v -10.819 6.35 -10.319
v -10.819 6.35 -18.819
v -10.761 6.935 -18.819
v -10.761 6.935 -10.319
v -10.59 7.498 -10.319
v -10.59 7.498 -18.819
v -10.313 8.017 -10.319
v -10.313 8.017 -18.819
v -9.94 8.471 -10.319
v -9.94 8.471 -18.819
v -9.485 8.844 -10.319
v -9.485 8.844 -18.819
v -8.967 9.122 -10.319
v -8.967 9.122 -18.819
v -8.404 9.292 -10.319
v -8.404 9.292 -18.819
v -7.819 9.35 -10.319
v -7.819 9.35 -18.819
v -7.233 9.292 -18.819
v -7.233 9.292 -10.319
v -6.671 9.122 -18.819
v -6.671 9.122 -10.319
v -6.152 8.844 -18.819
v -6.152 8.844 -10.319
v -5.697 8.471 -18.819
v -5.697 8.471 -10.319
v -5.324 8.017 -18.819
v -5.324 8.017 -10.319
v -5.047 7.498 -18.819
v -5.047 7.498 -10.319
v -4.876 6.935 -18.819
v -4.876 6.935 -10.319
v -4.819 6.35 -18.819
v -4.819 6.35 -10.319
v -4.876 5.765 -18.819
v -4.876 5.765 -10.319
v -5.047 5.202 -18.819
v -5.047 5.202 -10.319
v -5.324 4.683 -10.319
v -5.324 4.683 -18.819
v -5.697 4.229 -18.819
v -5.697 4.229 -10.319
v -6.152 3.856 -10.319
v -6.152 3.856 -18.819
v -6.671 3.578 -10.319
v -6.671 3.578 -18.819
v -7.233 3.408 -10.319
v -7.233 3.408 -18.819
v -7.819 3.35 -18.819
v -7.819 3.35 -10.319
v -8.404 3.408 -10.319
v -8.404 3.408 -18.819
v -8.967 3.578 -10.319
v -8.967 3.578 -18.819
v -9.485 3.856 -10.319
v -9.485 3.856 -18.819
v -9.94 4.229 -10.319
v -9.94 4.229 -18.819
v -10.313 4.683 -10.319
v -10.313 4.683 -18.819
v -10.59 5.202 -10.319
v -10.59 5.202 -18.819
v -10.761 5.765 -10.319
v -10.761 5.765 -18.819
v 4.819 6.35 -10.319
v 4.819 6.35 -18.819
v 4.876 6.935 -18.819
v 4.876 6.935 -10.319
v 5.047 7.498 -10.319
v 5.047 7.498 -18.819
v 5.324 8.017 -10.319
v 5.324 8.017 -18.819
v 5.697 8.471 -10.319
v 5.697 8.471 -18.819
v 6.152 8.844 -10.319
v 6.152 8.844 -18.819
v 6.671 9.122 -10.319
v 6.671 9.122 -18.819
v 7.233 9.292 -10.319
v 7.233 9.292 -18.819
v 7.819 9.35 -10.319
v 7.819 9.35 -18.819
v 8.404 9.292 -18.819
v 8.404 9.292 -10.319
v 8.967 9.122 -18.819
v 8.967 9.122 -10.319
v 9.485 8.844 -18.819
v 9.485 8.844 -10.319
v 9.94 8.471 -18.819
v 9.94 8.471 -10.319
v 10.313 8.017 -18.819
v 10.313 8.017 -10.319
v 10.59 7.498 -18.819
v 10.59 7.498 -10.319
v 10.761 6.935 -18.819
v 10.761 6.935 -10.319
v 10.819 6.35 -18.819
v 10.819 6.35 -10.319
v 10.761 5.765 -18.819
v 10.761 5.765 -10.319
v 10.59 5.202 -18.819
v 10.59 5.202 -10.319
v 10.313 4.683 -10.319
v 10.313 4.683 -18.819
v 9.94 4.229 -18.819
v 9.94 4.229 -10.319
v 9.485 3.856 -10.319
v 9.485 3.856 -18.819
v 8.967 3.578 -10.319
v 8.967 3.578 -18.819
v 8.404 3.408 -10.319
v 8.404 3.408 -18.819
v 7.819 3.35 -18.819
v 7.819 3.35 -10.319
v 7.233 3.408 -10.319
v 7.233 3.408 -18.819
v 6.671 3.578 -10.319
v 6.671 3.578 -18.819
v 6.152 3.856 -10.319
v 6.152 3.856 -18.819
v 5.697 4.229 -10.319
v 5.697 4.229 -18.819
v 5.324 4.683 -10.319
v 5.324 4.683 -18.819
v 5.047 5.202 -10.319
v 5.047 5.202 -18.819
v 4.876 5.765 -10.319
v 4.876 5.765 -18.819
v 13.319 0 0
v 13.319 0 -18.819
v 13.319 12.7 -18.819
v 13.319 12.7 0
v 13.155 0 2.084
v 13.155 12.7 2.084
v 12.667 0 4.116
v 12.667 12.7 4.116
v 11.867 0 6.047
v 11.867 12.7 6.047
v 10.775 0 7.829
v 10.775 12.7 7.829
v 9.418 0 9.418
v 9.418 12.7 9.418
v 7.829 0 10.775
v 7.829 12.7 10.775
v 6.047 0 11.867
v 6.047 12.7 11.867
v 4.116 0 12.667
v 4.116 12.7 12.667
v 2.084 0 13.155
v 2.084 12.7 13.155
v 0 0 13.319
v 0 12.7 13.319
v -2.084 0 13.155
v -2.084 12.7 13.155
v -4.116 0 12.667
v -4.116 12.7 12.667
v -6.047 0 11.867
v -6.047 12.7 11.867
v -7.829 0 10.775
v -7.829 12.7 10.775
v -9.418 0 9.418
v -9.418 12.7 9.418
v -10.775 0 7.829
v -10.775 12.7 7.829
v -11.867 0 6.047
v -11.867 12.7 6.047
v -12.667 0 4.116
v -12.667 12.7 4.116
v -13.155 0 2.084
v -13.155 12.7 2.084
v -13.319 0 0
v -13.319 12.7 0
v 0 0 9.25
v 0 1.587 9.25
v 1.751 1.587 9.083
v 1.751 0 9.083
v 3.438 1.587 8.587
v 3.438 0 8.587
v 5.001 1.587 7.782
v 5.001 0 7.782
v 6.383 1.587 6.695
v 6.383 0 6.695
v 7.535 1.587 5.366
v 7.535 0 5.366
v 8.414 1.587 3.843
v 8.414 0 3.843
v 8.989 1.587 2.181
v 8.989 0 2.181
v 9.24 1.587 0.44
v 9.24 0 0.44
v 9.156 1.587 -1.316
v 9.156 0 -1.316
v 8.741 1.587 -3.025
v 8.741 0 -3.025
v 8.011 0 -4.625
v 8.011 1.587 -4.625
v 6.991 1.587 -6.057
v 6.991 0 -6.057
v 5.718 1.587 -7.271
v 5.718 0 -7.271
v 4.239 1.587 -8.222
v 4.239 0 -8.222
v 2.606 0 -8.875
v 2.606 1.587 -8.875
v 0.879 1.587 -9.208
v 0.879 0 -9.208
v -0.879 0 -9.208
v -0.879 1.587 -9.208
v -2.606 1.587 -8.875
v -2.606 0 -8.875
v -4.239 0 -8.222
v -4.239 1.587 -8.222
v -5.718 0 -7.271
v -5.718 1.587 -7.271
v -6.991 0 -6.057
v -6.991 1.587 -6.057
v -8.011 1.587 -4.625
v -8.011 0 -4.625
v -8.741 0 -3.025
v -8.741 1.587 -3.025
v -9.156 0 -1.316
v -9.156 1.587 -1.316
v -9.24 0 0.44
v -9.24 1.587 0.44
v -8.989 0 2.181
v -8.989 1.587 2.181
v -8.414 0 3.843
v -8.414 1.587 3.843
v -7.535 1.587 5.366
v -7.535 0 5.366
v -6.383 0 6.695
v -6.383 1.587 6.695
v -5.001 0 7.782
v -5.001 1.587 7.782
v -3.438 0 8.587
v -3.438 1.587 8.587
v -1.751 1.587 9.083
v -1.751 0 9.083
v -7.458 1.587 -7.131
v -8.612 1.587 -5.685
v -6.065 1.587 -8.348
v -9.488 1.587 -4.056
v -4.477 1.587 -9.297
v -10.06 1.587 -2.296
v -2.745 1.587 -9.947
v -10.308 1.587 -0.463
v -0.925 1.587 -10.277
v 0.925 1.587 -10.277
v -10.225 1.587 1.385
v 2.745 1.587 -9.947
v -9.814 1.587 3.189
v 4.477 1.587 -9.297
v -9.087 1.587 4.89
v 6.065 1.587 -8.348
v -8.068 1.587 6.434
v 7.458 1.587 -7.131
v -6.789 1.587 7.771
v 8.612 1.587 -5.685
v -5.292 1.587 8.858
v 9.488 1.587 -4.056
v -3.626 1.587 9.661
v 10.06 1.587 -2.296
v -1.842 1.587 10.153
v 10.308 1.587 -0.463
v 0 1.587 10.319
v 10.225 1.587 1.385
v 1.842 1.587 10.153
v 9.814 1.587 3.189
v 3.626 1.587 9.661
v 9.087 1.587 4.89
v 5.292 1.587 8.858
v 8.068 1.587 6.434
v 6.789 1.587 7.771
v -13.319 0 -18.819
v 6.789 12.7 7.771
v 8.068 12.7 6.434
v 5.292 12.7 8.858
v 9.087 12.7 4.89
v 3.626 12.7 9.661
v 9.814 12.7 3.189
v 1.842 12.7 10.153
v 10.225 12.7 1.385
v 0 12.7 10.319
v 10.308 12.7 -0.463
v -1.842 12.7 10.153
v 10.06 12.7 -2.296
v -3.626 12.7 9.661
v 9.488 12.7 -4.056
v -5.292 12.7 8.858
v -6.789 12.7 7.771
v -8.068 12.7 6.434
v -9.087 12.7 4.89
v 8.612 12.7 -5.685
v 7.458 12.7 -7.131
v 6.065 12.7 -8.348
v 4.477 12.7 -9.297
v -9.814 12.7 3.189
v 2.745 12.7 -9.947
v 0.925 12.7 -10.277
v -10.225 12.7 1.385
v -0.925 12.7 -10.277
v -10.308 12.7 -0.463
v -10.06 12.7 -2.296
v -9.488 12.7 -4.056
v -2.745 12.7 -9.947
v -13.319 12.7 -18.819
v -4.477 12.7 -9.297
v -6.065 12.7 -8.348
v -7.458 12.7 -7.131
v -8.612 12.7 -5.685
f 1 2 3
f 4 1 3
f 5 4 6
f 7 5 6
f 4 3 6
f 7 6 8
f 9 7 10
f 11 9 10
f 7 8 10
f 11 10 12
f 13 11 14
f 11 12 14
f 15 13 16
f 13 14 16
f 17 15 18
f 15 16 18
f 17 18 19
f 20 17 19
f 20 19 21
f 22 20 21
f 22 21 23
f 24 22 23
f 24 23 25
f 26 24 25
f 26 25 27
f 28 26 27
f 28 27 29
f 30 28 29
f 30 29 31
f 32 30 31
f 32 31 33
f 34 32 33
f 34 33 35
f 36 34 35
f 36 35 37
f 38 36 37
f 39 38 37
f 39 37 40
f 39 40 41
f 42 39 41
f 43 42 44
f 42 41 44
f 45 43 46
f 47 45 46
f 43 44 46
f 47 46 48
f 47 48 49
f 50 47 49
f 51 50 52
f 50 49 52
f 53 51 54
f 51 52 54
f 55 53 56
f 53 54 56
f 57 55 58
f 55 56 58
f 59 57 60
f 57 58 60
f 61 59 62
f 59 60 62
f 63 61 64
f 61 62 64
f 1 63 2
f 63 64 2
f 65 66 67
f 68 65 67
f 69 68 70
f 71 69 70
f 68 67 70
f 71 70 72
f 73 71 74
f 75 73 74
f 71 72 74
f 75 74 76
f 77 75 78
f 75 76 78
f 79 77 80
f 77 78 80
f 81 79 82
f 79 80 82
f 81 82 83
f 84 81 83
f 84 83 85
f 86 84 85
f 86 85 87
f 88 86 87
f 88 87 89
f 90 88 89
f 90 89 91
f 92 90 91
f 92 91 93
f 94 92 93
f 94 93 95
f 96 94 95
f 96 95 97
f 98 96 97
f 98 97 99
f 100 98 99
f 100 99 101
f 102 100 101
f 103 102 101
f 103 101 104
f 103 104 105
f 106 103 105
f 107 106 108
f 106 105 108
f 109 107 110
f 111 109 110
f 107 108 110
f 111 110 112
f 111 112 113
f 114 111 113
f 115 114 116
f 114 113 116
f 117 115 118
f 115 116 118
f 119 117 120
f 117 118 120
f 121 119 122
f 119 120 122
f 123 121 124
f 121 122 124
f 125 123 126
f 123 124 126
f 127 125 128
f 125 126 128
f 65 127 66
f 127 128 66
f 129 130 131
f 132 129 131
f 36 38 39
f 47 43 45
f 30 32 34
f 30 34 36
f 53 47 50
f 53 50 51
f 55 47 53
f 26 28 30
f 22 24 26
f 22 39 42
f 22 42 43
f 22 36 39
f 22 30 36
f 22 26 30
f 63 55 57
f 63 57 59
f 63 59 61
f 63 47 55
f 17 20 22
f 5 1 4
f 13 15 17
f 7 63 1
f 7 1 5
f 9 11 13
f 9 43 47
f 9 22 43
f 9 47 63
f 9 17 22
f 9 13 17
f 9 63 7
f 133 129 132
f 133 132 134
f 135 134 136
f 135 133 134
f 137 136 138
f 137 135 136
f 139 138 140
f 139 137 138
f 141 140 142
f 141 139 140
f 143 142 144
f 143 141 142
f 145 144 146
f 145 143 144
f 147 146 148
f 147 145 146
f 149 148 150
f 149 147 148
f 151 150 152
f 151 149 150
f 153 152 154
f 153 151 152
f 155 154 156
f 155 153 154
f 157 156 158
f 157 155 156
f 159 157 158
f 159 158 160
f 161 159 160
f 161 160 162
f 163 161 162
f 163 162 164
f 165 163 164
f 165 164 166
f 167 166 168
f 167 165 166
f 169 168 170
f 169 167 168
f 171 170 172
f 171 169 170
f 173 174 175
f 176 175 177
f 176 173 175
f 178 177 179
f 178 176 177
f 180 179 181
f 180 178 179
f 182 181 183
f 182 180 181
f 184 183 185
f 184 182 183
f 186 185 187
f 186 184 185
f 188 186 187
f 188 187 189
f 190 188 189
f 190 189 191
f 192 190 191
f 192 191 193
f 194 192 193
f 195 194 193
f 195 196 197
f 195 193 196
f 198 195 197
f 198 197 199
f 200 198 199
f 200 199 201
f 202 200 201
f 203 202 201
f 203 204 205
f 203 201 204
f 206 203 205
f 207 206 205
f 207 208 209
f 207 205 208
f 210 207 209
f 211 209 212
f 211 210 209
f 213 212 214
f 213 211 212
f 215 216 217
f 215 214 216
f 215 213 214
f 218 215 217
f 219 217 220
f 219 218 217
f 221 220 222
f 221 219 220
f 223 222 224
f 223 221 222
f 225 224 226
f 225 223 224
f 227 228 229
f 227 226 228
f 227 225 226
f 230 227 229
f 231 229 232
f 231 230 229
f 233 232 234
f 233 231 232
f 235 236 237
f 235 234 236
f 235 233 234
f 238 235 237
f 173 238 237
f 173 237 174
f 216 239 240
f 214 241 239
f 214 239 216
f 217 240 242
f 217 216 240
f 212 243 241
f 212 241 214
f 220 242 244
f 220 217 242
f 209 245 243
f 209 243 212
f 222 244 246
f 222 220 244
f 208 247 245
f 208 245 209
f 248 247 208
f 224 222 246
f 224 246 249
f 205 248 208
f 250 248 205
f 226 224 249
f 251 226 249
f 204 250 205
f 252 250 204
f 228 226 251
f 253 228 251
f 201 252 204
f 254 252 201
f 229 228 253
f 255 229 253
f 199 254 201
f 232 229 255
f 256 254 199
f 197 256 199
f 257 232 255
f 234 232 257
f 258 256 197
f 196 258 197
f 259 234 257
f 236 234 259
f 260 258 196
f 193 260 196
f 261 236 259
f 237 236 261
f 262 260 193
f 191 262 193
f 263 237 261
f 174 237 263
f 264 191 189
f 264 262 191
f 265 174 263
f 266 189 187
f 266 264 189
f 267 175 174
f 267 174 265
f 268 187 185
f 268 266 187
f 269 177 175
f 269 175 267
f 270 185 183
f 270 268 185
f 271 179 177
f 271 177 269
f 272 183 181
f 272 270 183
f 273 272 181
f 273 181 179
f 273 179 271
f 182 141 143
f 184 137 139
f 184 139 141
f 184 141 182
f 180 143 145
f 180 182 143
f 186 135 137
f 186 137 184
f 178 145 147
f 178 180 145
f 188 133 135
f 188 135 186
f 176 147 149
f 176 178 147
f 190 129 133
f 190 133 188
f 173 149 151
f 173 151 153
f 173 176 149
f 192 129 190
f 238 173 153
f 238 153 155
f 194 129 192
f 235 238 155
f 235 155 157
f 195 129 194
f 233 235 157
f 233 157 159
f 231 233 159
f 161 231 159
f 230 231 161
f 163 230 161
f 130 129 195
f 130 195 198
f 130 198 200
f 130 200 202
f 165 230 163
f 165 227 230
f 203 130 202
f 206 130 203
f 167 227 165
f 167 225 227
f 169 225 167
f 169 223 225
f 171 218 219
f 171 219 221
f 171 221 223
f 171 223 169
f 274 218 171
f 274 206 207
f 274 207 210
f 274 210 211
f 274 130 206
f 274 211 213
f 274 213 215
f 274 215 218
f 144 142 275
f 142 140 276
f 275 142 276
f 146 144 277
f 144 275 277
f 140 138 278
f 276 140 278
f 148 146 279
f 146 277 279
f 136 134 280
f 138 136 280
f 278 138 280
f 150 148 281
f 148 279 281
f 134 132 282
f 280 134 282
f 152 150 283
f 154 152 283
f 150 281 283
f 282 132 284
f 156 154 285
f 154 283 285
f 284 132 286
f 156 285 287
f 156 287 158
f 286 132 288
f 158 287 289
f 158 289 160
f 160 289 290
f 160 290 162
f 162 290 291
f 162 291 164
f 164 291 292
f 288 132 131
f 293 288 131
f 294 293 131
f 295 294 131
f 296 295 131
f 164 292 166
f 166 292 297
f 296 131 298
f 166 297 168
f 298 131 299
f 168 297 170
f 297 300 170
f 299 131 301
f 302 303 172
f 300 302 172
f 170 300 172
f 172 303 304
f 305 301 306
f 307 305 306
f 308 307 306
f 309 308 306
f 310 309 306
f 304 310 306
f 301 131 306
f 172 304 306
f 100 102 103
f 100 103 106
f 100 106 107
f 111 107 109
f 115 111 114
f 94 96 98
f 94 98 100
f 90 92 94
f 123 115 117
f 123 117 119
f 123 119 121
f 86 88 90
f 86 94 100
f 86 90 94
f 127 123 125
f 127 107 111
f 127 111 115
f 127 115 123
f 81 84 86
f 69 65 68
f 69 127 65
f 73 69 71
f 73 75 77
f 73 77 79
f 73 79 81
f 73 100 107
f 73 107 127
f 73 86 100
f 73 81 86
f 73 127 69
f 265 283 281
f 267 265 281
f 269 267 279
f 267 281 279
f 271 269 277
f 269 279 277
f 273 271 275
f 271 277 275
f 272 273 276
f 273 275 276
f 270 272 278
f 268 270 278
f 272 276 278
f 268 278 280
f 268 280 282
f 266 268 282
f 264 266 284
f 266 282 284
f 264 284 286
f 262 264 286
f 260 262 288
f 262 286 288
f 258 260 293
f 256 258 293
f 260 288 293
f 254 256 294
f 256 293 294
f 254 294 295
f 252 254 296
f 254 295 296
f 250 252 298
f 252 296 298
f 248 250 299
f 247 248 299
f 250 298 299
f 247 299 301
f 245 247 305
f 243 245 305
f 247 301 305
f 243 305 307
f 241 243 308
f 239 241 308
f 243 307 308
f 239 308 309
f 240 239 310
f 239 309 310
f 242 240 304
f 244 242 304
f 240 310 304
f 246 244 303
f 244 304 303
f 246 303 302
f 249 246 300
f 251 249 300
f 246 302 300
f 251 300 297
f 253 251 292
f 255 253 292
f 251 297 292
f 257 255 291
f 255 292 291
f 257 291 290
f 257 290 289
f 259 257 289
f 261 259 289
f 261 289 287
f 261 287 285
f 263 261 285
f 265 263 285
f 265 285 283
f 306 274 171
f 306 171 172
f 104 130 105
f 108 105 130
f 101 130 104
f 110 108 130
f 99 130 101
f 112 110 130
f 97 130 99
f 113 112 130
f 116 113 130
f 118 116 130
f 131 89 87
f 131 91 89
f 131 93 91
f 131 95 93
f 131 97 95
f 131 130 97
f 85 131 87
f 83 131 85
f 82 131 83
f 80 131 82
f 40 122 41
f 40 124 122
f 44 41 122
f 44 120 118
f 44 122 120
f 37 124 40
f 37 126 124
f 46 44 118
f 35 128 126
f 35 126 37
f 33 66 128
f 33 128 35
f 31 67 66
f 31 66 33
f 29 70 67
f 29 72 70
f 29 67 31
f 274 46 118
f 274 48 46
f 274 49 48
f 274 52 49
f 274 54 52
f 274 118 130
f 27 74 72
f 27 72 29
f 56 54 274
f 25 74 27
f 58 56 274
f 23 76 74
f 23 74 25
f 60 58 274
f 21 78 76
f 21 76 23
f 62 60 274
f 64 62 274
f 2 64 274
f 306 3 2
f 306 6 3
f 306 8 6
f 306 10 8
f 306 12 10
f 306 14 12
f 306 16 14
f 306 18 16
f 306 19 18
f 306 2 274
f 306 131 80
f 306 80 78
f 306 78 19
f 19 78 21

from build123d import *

# Parameters (mm, degrees)
SKETCH1_R           = 9.25
BOSS_EXTRUDE1_DEPTH = 12.7
SKETCH2_R           = 10.31875
CUT_EXTRUDE1_DEPTH  = 11.1125
SKETCH3_R           = 3
CUT_EXTRUDE2_DEPTH  = 7.5
BOSS_EXTRUDE2_START = 1
SKETCH4_W           = 26.6375
SKETCH4_H           = 12.7
SKETCH4_R           = 3
BOSS_EXTRUDE2_DEPTH = 1


with BuildPart() as part:
    # Sketch1 → Boss-Extrude1 (new body)
    with BuildSketch(Plane(origin=(0, 0, 0), x_dir=(1, 0, 0), z_dir=(0, 1, 0))):
        with BuildLine():
            Line((-13.31875, 0), (-13.31875, 13.31875))
            Line((-13.31875, 13.31875), (-13.31875, 17.81875))
            Line((-13.31875, 17.81875), (13.31875, 17.81875))
            Line((13.31875, 17.81875), (13.31875, 13.31875))
            Line((13.31875, 13.31875), (13.31875, 0))
            ThreePointArc((13.31875, 0), (0, -13.31875), (-13.31875, 0))
        make_face()
        with Locations(Location((0, 0, 0), (0, 0, 270))):
            Circle(SKETCH1_R, mode=Mode.SUBTRACT)
    extrude(amount=BOSS_EXTRUDE1_DEPTH)

    # Sketch2 → Cut-Extrude1 (cut)
    with BuildSketch(Plane(origin=(0, 12.7, 0), x_dir=(1, 0, 0), z_dir=(0, 1, 0))):
        with Locations(Location((0, 0, 0), (0, 0, 270))):
            Circle(SKETCH2_R)
    extrude(amount=-CUT_EXTRUDE1_DEPTH, mode=Mode.SUBTRACT)

    # Sketch3 → Cut-Extrude2 (cut)
    with BuildSketch(Plane(origin=(0, 0, -17.81875), x_dir=(-1, 0, 0), z_dir=(0, 0, -1))):
        with Locations((-7.81875, 6.35)):
            Circle(SKETCH3_R)
        with Locations((7.81875, 6.35)):
            Circle(SKETCH3_R)
    extrude(amount=-CUT_EXTRUDE2_DEPTH, mode=Mode.SUBTRACT)

    # Sketch4 → Boss-Extrude2 (add)
    with BuildSketch(Plane(origin=(0, 0, -17.81875), x_dir=(-1, 0, 0), z_dir=(0, 0, -1)).offset(BOSS_EXTRUDE2_START)):
        with Locations((0, 6.35)):
            Rectangle(SKETCH4_W, SKETCH4_H)
        with Locations((-7.81875, 6.35)):
            Circle(SKETCH4_R, mode=Mode.SUBTRACT)
        with Locations((7.81875, 6.35)):
            Circle(SKETCH4_R, mode=Mode.SUBTRACT)
    extrude(amount=-BOSS_EXTRUDE2_DEPTH)


solid = part.part
